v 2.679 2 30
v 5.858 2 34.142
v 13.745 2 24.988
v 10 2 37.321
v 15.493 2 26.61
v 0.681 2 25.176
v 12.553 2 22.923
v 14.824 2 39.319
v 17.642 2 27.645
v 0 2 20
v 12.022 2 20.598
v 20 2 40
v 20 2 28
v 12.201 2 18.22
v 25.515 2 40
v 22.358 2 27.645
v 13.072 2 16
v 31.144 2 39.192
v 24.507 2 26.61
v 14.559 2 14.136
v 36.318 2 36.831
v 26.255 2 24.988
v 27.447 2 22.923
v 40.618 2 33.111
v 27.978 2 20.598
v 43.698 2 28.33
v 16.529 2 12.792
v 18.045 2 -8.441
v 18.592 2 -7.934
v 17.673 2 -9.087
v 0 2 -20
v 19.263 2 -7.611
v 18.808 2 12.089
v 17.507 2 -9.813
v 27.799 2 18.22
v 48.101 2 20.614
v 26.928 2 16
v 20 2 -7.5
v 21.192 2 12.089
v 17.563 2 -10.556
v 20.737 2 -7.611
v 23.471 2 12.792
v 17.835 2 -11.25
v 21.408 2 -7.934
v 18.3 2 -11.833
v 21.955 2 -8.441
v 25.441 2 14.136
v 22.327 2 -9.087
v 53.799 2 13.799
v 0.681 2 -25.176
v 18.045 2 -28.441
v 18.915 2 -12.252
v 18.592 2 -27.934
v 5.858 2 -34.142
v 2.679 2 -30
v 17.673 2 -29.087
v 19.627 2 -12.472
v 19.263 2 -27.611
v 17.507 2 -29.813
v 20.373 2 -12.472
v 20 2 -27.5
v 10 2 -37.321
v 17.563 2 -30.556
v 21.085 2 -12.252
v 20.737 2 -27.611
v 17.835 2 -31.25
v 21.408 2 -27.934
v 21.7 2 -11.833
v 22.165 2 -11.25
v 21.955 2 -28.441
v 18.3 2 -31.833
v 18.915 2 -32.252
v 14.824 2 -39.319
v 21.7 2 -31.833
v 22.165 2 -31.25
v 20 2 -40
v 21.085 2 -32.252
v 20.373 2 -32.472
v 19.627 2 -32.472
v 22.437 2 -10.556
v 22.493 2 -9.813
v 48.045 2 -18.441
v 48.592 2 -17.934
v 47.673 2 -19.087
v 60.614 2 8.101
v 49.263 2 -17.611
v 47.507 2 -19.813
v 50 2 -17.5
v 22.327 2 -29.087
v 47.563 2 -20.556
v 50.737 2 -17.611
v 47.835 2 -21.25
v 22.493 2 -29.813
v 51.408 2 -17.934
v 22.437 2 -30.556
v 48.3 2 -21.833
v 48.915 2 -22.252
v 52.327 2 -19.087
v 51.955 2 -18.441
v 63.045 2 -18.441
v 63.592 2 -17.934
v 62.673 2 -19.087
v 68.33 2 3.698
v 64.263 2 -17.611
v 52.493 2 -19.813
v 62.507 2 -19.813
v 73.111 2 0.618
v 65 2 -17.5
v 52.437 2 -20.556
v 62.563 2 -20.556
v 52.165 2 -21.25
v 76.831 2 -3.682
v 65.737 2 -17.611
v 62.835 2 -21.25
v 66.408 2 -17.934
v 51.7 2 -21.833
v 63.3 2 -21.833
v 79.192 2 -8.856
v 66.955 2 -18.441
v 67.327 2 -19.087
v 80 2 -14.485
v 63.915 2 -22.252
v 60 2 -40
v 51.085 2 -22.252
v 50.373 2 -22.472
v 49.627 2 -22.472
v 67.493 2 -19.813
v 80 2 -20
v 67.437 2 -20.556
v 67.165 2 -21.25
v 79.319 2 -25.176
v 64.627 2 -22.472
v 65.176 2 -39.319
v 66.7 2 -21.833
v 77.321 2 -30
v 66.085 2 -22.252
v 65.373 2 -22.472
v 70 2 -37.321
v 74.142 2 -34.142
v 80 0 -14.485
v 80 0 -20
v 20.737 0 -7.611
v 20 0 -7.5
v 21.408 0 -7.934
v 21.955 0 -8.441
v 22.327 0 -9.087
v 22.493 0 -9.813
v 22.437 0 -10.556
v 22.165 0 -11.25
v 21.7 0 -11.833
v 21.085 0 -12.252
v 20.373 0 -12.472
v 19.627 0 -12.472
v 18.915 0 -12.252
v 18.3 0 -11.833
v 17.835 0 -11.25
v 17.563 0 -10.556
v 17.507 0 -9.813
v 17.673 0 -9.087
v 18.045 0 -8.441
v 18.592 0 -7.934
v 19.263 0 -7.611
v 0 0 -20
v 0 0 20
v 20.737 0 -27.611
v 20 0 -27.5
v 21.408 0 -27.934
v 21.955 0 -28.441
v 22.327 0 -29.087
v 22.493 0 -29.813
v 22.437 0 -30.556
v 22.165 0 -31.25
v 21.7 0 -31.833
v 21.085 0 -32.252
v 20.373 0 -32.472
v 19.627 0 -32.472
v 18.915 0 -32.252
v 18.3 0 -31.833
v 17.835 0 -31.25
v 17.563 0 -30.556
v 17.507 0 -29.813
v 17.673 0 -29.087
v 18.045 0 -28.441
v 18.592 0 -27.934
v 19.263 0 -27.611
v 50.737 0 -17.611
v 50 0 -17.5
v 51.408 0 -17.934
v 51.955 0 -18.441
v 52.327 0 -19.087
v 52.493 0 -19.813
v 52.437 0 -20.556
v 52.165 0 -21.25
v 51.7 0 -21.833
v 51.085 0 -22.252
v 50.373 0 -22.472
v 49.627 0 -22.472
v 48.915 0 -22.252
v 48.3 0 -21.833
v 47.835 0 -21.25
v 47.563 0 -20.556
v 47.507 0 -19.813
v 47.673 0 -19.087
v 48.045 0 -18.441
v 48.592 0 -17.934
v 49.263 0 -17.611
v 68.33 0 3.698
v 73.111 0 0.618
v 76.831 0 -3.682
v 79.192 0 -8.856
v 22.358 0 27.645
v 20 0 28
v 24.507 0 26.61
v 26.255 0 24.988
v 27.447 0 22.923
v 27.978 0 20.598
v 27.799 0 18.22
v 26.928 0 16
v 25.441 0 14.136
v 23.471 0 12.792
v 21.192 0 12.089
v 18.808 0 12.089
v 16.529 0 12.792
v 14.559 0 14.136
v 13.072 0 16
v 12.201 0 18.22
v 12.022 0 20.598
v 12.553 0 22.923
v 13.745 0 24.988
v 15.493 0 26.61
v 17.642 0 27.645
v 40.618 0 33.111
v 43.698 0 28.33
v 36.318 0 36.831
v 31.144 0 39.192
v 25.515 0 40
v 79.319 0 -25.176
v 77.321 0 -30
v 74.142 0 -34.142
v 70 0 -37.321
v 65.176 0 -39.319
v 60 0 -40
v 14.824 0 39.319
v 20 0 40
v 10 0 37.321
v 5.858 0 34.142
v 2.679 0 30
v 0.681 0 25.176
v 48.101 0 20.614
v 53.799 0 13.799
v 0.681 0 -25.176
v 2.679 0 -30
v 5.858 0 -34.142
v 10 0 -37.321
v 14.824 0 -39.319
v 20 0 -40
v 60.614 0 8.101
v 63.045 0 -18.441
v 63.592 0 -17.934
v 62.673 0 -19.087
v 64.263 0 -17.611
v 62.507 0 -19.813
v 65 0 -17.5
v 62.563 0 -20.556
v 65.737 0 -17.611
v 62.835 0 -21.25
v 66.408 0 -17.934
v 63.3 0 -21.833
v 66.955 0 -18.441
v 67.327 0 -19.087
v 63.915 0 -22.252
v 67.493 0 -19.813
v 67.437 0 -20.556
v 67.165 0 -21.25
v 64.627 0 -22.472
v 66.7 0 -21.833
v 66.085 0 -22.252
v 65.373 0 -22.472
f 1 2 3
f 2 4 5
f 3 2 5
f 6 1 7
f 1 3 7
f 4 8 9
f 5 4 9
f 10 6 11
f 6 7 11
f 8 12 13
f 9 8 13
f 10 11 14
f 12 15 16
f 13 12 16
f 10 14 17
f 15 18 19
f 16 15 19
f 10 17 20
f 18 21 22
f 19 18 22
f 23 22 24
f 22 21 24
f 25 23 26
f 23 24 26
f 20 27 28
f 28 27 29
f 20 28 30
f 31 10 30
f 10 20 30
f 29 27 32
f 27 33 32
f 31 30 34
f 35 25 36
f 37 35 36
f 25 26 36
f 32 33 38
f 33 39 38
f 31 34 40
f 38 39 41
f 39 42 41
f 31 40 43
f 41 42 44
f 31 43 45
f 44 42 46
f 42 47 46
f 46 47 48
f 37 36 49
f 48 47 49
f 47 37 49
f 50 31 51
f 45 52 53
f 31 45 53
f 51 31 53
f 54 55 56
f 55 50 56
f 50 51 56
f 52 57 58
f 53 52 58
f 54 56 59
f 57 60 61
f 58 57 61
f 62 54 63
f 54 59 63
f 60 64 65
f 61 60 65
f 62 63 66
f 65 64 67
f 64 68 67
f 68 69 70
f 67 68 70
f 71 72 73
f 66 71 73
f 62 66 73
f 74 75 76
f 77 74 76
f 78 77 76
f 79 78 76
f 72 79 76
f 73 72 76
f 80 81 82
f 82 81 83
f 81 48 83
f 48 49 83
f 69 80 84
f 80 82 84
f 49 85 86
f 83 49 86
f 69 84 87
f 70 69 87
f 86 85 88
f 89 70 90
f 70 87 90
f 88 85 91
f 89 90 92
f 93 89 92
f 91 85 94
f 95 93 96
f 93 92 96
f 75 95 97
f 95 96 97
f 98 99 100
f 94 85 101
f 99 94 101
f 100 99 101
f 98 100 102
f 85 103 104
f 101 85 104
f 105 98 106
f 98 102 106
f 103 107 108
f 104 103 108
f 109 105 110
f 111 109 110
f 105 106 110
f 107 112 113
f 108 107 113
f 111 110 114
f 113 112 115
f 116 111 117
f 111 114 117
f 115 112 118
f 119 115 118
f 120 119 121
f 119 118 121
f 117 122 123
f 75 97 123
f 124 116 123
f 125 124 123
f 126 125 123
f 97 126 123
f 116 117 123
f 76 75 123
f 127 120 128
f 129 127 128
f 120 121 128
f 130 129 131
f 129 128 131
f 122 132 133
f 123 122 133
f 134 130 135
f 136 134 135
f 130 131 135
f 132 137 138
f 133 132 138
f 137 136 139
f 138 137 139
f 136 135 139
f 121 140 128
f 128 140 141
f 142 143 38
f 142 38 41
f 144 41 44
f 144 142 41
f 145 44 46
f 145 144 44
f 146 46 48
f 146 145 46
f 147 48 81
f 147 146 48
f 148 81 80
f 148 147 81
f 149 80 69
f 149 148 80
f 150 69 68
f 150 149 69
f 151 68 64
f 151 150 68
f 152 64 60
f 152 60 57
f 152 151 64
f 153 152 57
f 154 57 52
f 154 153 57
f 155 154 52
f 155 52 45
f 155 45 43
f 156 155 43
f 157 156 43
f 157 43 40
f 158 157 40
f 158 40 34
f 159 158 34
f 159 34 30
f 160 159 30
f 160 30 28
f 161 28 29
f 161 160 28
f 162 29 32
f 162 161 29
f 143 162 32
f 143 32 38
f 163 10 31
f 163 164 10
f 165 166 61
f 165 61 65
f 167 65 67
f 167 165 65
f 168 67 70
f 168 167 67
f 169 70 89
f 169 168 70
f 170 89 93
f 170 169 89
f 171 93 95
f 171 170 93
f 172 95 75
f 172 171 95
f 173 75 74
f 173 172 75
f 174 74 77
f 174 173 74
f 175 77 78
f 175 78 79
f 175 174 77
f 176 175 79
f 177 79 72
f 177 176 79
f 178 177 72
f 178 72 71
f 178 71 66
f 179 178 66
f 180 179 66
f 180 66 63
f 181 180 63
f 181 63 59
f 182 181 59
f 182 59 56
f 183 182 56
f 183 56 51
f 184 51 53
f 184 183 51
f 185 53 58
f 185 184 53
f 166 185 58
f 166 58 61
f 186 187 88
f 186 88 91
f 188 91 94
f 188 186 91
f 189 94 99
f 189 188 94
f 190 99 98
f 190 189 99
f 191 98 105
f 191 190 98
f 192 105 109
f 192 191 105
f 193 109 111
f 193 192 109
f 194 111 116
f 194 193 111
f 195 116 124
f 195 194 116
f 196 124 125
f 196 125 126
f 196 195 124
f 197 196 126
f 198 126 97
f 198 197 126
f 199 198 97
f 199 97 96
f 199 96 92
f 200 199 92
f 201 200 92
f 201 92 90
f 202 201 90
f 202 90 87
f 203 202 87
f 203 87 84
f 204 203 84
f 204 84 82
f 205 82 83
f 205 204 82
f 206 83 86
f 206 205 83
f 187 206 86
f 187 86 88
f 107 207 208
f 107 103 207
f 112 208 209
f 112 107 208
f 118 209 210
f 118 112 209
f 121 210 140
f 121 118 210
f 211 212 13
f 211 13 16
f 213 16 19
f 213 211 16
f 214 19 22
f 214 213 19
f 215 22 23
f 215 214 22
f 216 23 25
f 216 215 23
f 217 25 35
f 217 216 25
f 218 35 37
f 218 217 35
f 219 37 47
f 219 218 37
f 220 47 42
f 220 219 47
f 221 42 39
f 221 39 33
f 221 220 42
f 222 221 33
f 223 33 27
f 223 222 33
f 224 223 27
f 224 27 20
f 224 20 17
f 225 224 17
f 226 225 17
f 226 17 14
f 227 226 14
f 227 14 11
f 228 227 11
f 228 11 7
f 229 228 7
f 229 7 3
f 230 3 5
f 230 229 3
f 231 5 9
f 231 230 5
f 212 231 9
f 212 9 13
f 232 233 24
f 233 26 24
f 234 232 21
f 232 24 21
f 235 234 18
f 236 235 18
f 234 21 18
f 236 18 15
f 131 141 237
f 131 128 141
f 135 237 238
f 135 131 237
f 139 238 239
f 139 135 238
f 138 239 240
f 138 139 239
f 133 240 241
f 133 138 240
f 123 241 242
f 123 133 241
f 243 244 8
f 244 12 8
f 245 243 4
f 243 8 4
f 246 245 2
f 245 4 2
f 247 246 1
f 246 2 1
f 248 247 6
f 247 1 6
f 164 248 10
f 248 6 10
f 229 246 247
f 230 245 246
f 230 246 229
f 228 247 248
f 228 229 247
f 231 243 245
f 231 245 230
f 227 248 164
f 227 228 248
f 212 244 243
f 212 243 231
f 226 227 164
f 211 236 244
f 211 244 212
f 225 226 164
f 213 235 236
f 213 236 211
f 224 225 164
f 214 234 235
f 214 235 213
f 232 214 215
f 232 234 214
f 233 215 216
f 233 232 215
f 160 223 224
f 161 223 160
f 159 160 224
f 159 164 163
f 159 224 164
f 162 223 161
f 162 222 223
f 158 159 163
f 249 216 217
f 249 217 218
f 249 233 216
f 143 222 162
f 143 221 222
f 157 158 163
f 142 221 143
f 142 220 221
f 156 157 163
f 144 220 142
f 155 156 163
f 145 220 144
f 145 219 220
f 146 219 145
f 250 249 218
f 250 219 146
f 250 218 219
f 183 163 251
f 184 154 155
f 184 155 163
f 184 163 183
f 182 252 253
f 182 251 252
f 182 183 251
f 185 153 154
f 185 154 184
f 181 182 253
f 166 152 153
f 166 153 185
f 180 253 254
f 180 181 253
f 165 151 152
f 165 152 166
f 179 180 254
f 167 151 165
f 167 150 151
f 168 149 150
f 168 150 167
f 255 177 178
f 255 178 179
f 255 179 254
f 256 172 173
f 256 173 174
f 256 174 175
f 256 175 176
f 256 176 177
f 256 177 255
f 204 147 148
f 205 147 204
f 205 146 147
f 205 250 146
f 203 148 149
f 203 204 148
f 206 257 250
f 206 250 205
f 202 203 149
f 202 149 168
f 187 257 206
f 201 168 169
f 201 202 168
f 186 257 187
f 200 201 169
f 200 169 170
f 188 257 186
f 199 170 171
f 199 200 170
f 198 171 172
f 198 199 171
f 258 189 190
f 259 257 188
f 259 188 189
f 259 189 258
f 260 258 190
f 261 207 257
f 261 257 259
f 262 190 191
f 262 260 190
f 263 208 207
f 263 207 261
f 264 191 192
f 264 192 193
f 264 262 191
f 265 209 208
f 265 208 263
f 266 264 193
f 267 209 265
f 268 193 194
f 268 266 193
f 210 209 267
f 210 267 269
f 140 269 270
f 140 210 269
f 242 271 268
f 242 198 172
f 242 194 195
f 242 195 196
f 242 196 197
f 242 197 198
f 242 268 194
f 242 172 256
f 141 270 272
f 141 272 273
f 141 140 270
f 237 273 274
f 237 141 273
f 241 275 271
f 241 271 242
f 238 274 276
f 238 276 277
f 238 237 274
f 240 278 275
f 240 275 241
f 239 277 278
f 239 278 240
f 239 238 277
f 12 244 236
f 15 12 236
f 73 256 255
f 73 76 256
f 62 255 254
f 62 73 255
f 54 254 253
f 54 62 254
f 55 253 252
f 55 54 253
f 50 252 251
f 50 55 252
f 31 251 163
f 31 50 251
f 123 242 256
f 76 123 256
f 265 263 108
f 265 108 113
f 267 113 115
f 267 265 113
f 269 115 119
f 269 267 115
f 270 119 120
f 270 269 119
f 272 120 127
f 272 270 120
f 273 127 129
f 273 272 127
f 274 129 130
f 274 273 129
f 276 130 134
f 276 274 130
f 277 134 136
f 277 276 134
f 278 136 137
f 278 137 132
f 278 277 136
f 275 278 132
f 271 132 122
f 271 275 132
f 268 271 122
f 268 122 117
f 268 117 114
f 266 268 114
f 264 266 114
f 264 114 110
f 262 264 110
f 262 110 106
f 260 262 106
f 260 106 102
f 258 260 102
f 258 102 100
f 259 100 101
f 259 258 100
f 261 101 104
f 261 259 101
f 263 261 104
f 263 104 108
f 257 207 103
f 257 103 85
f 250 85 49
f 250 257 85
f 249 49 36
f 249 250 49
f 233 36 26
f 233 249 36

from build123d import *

# Parameters (mm, degrees)
SKETCH1_R           = 2.5
SKETCH1_W           = 40
SKETCH1_H           = 40
SKETCH1_R_2         = 8
BOSS_EXTRUDE1_DEPTH = 2
FILLET1_R           = 50
FILLET2_R           = 20


with BuildPart() as part:
    # Sketch1 → Boss-Extrude1 (new body)
    # profile 1 of 2: a face of its own
    with BuildSketch(Plane(origin=(0, 0, 0), x_dir=(1, 0, 0), z_dir=(0, 1, 0))):
        Polygon((80, 0), (80, 40), (0, 40), (0, 0), (40, 0), align=None)
        with Locations(Location((20, 10, 0), (0, 0, 270))):
            Circle(SKETCH1_R, mode=Mode.SUBTRACT)
        with Locations(Location((20, 30, 0), (0, 0, 270))):
            Circle(SKETCH1_R, mode=Mode.SUBTRACT)
        with Locations(Location((50, 20, 0), (0, 0, 270))):
            Circle(SKETCH1_R, mode=Mode.SUBTRACT)
        with Locations(Location((65, 20, 0), (0, 0, 270))):
            Circle(SKETCH1_R, mode=Mode.SUBTRACT)
    # profile 2 of 2: a face of its own
    with BuildSketch(Plane(origin=(0, 0, 0), x_dir=(1, 0, 0), z_dir=(0, 1, 0))):
        with Locations((20, -20)):
            Rectangle(SKETCH1_W, SKETCH1_H)
        with Locations(Location((20, -20, 0), (0, 0, 270))):
            Circle(SKETCH1_R_2, mode=Mode.SUBTRACT)
    extrude(amount=BOSS_EXTRUDE1_DEPTH)

    # Fillet1
    # the kernel refuses this fillet: 50 mm, written as the material it adds along each edge
    with BuildSketch(Plane(origin=(40, 0, 0), x_dir=(0, 0, 1), z_dir=(0, 1, 0))) as fillet1_piece_1:
        with BuildLine():
            CenterArc((49.154759474, 49.154759474), FILLET1_R, 190.550098012, 68.899803976)
            Line((0, 40), (0, 0))
            Line((0, 0), (40, 0))
        make_face()
    extrude(amount=2)

    # Fillet2
    fillet2_edges = [part.edges().sort_by_distance(p)[0] for p in [
        (80, 1, -40),
        (80, 1, 0),
        (40, 1, 40),
        (0, 1, 40),
        (0, 1, -40),
    ]]
    fillet(fillet2_edges, radius=FILLET2_R)


solid = part.part
